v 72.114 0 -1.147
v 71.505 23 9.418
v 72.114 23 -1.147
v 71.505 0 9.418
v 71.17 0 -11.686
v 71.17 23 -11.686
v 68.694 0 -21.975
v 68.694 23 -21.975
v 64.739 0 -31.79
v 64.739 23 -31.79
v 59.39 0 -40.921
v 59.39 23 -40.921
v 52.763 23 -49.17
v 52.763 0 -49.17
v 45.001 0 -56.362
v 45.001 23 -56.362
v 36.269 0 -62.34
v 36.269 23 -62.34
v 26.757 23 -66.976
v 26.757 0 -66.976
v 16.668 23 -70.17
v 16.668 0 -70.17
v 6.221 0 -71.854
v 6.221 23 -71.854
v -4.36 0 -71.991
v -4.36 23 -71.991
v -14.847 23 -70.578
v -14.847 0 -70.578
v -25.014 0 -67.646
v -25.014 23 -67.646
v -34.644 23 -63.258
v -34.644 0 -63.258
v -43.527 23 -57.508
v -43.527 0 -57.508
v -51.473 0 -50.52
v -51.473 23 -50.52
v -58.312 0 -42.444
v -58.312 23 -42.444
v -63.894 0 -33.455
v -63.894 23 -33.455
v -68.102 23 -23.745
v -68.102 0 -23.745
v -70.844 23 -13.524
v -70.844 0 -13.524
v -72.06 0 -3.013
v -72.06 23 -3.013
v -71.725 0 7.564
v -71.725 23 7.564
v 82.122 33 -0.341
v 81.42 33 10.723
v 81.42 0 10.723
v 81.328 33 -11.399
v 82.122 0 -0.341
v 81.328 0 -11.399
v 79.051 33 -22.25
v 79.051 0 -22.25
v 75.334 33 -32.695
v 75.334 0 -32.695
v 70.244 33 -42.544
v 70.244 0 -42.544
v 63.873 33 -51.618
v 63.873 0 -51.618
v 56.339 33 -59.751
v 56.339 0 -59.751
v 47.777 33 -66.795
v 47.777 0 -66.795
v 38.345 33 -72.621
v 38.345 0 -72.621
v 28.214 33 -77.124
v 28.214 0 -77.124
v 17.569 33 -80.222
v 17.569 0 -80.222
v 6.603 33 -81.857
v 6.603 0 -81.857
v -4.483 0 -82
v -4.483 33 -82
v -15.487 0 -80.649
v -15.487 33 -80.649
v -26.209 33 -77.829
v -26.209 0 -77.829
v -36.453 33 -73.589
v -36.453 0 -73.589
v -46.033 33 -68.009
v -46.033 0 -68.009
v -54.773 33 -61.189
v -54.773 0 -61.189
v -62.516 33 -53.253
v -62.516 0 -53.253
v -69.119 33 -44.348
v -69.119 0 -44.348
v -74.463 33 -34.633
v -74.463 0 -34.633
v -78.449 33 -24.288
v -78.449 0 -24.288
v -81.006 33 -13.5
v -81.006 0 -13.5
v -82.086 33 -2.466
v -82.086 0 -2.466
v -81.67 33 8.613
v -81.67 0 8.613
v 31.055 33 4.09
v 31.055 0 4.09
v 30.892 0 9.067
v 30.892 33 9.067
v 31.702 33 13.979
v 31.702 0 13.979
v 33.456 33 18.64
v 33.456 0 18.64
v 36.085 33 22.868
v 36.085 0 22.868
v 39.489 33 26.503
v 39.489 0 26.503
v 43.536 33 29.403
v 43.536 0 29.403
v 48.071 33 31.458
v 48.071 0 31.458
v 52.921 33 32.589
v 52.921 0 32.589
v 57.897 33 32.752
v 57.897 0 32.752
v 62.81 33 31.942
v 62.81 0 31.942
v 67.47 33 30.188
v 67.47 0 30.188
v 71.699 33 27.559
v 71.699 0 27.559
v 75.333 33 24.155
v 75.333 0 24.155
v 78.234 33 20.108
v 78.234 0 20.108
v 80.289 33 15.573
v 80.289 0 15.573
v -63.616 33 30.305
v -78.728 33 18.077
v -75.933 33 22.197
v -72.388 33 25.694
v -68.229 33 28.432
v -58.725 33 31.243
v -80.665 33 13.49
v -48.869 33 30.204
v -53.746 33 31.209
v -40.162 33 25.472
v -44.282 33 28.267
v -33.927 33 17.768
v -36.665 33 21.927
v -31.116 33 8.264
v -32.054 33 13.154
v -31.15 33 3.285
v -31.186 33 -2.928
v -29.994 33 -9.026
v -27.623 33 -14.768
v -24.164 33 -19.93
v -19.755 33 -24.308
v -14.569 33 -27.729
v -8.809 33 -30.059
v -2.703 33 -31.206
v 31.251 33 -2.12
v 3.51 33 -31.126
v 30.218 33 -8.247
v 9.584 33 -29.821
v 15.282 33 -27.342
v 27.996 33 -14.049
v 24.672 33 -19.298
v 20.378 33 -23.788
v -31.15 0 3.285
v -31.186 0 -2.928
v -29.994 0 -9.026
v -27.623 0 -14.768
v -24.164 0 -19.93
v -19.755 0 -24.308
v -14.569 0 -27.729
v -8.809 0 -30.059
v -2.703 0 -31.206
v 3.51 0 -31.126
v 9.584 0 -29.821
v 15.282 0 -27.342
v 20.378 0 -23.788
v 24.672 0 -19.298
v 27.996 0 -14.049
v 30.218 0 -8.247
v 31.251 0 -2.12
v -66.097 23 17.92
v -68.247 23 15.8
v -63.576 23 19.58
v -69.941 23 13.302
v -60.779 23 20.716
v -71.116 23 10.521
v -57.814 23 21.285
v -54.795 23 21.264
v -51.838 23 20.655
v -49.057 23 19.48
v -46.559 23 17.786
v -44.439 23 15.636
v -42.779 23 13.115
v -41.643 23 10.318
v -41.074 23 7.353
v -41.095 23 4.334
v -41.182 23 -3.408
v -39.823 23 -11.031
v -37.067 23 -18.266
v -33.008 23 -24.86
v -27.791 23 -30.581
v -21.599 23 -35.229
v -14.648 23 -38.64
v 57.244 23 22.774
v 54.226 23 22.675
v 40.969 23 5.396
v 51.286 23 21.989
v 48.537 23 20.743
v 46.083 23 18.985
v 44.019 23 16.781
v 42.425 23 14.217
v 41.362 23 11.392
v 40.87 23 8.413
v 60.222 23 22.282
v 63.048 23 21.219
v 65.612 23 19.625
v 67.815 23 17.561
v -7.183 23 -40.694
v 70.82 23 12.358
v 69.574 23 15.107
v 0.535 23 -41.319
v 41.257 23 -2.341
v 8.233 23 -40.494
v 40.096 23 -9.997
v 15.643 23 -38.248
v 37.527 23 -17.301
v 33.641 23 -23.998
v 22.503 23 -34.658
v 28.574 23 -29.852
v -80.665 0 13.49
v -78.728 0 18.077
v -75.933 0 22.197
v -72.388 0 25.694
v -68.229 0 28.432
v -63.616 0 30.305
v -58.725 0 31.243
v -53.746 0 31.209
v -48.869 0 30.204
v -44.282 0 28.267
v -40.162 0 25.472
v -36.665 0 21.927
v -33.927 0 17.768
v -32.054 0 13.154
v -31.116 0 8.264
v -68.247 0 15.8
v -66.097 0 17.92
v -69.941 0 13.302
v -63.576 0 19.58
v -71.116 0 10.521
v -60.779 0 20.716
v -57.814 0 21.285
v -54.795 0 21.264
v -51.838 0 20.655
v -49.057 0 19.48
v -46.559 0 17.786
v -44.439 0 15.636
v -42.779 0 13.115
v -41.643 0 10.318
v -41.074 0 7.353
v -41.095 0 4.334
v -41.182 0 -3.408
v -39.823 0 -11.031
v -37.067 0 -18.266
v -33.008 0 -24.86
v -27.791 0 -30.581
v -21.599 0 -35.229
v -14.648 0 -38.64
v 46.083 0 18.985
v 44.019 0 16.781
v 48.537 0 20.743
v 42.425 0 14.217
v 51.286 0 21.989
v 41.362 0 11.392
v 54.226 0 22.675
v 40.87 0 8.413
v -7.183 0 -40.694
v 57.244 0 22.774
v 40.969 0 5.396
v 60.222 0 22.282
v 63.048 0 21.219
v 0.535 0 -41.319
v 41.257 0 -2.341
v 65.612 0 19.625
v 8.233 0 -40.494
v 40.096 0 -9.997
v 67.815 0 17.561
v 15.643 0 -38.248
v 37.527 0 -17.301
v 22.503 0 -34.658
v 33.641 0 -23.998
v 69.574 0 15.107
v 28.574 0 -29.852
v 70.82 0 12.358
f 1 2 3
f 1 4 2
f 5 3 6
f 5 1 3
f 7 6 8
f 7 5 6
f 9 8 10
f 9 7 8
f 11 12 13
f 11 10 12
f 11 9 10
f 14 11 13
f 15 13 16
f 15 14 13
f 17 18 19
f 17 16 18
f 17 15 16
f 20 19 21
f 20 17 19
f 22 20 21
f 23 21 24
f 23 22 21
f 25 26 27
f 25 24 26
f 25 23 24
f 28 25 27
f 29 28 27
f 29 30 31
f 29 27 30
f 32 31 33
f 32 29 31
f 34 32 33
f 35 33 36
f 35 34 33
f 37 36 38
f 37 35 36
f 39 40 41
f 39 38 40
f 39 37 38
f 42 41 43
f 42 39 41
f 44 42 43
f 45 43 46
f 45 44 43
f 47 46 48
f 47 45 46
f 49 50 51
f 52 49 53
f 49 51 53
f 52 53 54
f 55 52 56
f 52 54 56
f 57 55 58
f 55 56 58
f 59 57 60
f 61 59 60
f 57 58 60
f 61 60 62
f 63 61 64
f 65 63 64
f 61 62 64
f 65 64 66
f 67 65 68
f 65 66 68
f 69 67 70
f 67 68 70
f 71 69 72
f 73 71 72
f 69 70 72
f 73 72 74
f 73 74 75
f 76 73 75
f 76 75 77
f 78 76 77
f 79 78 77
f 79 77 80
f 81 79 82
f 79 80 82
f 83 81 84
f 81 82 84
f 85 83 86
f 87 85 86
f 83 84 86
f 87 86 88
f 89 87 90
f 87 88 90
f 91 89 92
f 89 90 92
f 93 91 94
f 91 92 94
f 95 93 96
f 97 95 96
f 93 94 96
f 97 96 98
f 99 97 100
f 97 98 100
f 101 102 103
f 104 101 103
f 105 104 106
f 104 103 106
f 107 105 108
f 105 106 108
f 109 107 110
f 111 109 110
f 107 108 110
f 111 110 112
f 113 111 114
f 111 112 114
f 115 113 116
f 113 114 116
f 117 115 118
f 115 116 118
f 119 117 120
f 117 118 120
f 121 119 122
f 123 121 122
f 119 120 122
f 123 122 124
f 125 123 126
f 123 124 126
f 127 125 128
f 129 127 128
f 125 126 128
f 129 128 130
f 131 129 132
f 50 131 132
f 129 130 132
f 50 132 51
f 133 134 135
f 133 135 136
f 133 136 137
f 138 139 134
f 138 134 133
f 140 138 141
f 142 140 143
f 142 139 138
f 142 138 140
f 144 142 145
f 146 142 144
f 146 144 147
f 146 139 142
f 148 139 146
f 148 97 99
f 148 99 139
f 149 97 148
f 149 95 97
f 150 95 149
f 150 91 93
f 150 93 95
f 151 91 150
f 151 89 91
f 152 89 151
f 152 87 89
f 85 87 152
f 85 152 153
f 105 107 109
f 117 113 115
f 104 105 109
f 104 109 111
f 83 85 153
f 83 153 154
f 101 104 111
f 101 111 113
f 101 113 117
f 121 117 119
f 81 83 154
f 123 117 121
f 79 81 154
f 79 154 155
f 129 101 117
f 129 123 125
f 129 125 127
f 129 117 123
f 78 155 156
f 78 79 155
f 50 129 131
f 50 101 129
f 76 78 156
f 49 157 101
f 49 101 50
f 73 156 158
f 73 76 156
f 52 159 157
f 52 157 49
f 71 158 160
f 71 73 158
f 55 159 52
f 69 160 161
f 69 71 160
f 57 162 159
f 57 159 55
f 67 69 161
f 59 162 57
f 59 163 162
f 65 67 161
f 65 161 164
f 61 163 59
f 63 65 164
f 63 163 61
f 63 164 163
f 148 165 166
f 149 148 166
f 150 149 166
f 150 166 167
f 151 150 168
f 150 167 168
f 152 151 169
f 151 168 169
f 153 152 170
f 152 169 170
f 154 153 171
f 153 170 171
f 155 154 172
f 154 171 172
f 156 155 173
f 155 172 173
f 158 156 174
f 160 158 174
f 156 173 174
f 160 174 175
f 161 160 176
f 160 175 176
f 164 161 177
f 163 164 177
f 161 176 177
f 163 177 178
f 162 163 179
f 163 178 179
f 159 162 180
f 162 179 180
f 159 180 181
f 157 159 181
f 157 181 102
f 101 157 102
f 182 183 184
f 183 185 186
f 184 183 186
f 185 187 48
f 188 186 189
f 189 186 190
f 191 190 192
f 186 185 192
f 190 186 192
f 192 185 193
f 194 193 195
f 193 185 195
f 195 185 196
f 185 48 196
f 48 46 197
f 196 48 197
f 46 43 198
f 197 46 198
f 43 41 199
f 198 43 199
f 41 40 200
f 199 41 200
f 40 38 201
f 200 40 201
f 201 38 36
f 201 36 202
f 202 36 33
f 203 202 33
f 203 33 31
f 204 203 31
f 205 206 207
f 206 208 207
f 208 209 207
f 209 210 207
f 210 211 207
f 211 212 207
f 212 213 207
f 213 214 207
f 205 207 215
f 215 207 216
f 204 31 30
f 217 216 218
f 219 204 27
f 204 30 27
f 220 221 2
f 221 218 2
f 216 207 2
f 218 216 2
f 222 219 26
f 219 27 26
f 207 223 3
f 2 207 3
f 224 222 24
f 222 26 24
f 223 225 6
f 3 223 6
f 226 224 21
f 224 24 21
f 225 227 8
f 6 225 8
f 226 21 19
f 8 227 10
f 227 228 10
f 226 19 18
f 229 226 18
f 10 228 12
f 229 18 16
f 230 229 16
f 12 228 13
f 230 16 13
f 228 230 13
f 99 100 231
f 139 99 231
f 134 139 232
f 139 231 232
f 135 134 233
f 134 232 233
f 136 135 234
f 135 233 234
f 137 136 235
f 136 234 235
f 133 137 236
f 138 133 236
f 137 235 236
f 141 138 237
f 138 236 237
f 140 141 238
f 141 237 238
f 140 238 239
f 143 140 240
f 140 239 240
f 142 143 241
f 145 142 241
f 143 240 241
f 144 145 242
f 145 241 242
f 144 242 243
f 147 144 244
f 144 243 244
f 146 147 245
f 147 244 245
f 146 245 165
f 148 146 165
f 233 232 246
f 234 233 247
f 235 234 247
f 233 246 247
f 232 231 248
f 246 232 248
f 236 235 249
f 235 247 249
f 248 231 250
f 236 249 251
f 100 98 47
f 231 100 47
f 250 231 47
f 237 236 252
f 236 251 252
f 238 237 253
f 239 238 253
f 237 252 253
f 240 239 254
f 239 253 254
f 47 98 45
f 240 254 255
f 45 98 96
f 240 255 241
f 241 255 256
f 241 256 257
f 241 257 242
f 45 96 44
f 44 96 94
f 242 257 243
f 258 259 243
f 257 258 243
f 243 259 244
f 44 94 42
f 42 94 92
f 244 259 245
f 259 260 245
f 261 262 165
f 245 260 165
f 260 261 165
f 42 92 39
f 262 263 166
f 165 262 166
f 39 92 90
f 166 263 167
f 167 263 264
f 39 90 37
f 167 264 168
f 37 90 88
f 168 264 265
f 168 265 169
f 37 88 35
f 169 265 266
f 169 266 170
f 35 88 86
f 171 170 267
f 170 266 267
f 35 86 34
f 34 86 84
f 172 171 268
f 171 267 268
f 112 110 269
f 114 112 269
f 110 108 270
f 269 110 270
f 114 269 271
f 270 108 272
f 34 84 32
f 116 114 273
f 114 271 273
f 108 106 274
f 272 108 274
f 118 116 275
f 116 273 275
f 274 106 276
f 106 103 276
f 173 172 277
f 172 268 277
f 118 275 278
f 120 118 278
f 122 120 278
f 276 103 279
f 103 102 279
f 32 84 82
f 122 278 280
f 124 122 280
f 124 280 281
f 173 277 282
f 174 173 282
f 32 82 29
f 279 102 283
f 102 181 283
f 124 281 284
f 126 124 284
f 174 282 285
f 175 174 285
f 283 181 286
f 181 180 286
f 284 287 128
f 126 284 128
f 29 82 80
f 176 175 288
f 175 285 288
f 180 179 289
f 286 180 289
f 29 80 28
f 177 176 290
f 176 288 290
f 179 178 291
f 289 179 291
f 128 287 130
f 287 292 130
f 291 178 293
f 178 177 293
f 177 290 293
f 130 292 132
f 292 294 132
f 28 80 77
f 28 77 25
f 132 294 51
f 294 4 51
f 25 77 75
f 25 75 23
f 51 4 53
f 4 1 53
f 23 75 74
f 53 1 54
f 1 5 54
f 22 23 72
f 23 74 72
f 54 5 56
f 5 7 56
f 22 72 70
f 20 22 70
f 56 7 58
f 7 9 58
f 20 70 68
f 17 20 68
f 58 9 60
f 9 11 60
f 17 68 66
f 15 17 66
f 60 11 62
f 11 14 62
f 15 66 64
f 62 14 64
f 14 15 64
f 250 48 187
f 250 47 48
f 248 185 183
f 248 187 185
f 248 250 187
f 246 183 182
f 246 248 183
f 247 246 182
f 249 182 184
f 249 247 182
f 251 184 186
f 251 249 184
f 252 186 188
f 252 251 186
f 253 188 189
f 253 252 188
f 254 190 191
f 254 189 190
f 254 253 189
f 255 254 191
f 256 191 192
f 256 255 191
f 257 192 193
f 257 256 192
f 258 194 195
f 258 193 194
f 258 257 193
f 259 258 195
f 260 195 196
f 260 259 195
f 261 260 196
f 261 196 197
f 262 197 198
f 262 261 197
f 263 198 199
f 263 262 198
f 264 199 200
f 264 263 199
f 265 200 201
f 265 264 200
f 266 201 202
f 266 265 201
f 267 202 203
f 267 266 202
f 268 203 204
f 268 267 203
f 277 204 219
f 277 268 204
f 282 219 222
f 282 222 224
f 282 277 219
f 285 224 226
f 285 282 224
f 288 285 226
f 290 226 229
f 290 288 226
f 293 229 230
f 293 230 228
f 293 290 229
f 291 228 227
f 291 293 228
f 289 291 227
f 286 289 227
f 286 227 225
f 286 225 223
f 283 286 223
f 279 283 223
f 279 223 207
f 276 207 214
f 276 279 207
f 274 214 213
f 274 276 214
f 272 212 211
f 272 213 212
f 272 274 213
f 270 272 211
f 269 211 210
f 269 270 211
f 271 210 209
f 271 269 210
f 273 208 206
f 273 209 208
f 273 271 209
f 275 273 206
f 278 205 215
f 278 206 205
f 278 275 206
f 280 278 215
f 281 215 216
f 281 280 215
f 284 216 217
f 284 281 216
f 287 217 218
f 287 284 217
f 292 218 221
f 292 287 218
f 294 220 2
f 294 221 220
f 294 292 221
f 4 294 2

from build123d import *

# Parameters (mm, degrees)
BOSS_EXTRUDE1_DEPTH = 33
SHELL1_T            = -10


with BuildPart() as part:
    # Sketch1 → Boss-Extrude1 (new body)
    with BuildSketch(Plane(origin=(0, 0, 0), x_dir=(1, 0, 0), z_dir=(0, 1, 0))):
        with BuildLine():
            ThreePointArc((81.419785193, -10.723465188), (1.062753422, 82.116043997), (-81.670036167, -8.612741664))
            ThreePointArc((-81.670036167, -8.612741664), (-53.746253944, -31.208811817), (-31.150183791, -3.285029594))
            ThreePointArc((-31.150183791, -3.285029594), (0.405350187, 31.320297905), (31.054734295, -4.090091387))
            ThreePointArc((31.054734295, -4.090091387), (52.920572843, -32.589303736), (81.419785193, -10.723465188))
        make_face()
    extrude(amount=BOSS_EXTRUDE1_DEPTH)

    # Shell1
    shell1_openings = [part.faces().sort_by_distance(p)[0] for p in [
        (-53.956492273, 0, 29.21523386),
    ]]
    offset(amount=SHELL1_T, openings=shell1_openings, kind=Kind.INTERSECTION)


solid = part.part
